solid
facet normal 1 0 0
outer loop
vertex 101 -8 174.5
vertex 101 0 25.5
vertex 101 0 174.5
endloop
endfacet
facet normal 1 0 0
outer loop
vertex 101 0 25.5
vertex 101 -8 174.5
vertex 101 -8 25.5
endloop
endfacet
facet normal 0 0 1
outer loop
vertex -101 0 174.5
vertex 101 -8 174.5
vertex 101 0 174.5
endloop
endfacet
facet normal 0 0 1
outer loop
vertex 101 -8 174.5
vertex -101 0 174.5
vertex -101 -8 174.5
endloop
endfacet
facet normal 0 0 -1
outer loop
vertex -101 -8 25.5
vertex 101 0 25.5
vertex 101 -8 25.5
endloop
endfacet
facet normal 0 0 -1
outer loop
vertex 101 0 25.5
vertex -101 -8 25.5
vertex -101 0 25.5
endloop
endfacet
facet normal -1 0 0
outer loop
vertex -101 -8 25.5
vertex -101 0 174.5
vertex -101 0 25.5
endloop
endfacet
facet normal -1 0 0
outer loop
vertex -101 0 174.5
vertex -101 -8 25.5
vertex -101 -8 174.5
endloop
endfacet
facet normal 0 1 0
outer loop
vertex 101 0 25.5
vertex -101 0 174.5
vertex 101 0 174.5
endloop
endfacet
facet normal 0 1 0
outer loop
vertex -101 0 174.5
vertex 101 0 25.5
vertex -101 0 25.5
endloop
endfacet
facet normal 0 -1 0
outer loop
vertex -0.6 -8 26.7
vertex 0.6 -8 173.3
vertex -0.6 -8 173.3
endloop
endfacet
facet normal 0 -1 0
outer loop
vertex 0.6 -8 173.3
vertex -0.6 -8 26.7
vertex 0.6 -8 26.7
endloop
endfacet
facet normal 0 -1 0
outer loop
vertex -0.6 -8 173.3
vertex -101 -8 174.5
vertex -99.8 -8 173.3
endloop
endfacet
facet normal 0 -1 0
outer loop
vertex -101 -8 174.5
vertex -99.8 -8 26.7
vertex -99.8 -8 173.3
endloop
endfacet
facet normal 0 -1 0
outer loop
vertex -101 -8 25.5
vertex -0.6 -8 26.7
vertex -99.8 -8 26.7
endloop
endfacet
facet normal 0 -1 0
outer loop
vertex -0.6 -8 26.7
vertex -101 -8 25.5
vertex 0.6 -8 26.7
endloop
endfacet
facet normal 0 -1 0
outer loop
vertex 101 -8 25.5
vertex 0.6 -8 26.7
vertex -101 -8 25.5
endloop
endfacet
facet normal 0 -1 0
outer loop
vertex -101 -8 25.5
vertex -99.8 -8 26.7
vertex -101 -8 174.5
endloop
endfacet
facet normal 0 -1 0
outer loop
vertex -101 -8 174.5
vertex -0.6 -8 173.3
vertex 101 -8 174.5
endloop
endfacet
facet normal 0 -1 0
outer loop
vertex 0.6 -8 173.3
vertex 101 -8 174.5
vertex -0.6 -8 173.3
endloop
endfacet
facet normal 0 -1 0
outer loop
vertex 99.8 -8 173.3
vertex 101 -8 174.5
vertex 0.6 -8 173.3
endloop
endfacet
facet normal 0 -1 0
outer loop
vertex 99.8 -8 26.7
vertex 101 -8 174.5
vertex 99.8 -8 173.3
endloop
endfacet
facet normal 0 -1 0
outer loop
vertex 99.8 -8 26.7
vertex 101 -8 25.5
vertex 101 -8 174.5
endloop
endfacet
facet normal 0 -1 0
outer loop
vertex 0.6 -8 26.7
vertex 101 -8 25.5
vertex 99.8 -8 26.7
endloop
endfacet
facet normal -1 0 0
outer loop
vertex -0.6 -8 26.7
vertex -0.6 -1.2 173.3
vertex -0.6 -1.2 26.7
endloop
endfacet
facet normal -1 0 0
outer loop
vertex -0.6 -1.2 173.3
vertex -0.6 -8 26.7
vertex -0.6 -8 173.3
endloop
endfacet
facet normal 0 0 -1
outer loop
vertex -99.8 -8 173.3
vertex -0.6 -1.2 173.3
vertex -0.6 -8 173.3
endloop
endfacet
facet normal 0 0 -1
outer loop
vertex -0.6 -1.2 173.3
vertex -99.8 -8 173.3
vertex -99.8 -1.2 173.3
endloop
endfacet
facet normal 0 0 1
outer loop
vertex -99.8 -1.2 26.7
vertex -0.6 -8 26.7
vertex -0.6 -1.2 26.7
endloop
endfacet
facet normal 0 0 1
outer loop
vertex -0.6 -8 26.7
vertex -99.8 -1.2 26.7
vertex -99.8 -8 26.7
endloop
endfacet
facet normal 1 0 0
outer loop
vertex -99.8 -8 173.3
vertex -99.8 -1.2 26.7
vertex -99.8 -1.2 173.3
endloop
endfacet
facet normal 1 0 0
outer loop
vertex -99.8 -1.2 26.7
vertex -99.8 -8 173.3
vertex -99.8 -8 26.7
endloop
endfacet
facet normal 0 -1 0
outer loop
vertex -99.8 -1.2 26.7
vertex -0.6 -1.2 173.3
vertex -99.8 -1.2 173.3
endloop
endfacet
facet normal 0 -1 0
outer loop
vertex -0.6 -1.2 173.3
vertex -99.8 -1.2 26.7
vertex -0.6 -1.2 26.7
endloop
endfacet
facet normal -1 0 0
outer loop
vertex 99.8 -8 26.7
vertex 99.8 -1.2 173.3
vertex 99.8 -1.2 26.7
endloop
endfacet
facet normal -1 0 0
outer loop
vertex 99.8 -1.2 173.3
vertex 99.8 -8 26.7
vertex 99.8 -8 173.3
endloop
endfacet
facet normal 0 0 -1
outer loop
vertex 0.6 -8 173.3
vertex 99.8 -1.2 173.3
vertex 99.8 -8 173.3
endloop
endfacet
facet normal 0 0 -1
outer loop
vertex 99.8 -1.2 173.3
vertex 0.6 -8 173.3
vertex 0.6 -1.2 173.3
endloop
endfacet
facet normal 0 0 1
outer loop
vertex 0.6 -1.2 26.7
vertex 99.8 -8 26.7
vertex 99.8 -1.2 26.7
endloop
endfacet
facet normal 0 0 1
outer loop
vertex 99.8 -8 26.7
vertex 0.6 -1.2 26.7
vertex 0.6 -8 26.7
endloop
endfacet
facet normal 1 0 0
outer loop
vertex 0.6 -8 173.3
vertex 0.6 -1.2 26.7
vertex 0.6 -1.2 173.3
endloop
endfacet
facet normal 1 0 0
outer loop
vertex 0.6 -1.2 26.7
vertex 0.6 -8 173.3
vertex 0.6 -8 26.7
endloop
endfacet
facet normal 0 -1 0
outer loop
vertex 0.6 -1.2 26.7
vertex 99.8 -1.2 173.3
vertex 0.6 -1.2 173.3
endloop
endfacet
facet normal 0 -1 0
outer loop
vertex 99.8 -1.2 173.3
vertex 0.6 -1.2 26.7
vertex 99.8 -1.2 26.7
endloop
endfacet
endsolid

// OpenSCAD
//font="Bitstream Vera Sans Bold";
//font="Arial Black";
font="Baskerville:style=Bold";
text_on_flat="Barcelona";
text_size=40;
depth=40;
spacing=1;

frame_z_offset = 0.5*text_size;

frame_width=10;
frame_depth=20;
frame_cover_overlap=frame_width*0.5;
picture_overlap=frame_width-frame_cover_overlap;

picture_x=203;
picture_z=150;
picture_depth=0.5*frame_depth;

cover_spacing=0.5;
cover_wall_width=1.2;
cover_depth_multiplier=0.8;



module the_text() {
linear_extrude(height=depth, convexity=4)
    text(text_on_flat, 
         size=text_size,
         font=font,
         halign="center",
         spacing=spacing);
}

module picture_frame() {
    frame_size_x = picture_x - 2*picture_overlap + 2*frame_width;
    frame_size_z = picture_z - 2*picture_overlap + 2*frame_width;
    window_size_x = picture_x - 2*picture_overlap;
    window_size_z = picture_z - 2*picture_overlap;
    translate([-0.5*frame_size_x, 0, 0]) difference() {
        cube([frame_size_x, frame_depth, frame_size_z]);
        translate([frame_width, 0, frame_width]) cube([window_size_x, frame_depth, window_size_z]);
    }    
}

module base_frame_with_text() {
  rotate([90, 0, 0]) the_text();
  translate([0, -frame_depth, frame_z_offset]) picture_frame();
}

module picture_cut() {
  real_picture_depth=frame_depth-picture_depth;
  translate([-0.5*picture_x, -real_picture_depth, frame_z_offset+frame_width-picture_overlap]) cube([picture_x, real_picture_depth, picture_z]);
}


module the_frame() {
    difference() {
      base_frame_with_text();
      picture_cut();
    }
}

module cover() {
  real_cover_depth=cover_depth_multiplier*(frame_depth-picture_depth);
  cover_x = picture_x-2*cover_spacing;
  cover_z = picture_z-2*cover_spacing;
  cut_x = 0.5*(cover_x-3*cover_wall_width);
  cut_z = cover_z-2*cover_wall_width;
  cut_y = real_cover_depth-cover_wall_width;
  
  translate([-0.5*cover_x, -real_cover_depth, frame_z_offset+frame_width-picture_overlap+cover_spacing]) 
    difference() {
      cube([cover_x, real_cover_depth, cover_z]);
      translate([cover_wall_width, 0, cover_wall_width]) cube([cut_x, cut_y, cut_z]);
      translate([cut_x+2*cover_wall_width, 0, cover_wall_width]) cube([cut_x, cut_y, cut_z]);
    }
}


//the_frame();
cover();
